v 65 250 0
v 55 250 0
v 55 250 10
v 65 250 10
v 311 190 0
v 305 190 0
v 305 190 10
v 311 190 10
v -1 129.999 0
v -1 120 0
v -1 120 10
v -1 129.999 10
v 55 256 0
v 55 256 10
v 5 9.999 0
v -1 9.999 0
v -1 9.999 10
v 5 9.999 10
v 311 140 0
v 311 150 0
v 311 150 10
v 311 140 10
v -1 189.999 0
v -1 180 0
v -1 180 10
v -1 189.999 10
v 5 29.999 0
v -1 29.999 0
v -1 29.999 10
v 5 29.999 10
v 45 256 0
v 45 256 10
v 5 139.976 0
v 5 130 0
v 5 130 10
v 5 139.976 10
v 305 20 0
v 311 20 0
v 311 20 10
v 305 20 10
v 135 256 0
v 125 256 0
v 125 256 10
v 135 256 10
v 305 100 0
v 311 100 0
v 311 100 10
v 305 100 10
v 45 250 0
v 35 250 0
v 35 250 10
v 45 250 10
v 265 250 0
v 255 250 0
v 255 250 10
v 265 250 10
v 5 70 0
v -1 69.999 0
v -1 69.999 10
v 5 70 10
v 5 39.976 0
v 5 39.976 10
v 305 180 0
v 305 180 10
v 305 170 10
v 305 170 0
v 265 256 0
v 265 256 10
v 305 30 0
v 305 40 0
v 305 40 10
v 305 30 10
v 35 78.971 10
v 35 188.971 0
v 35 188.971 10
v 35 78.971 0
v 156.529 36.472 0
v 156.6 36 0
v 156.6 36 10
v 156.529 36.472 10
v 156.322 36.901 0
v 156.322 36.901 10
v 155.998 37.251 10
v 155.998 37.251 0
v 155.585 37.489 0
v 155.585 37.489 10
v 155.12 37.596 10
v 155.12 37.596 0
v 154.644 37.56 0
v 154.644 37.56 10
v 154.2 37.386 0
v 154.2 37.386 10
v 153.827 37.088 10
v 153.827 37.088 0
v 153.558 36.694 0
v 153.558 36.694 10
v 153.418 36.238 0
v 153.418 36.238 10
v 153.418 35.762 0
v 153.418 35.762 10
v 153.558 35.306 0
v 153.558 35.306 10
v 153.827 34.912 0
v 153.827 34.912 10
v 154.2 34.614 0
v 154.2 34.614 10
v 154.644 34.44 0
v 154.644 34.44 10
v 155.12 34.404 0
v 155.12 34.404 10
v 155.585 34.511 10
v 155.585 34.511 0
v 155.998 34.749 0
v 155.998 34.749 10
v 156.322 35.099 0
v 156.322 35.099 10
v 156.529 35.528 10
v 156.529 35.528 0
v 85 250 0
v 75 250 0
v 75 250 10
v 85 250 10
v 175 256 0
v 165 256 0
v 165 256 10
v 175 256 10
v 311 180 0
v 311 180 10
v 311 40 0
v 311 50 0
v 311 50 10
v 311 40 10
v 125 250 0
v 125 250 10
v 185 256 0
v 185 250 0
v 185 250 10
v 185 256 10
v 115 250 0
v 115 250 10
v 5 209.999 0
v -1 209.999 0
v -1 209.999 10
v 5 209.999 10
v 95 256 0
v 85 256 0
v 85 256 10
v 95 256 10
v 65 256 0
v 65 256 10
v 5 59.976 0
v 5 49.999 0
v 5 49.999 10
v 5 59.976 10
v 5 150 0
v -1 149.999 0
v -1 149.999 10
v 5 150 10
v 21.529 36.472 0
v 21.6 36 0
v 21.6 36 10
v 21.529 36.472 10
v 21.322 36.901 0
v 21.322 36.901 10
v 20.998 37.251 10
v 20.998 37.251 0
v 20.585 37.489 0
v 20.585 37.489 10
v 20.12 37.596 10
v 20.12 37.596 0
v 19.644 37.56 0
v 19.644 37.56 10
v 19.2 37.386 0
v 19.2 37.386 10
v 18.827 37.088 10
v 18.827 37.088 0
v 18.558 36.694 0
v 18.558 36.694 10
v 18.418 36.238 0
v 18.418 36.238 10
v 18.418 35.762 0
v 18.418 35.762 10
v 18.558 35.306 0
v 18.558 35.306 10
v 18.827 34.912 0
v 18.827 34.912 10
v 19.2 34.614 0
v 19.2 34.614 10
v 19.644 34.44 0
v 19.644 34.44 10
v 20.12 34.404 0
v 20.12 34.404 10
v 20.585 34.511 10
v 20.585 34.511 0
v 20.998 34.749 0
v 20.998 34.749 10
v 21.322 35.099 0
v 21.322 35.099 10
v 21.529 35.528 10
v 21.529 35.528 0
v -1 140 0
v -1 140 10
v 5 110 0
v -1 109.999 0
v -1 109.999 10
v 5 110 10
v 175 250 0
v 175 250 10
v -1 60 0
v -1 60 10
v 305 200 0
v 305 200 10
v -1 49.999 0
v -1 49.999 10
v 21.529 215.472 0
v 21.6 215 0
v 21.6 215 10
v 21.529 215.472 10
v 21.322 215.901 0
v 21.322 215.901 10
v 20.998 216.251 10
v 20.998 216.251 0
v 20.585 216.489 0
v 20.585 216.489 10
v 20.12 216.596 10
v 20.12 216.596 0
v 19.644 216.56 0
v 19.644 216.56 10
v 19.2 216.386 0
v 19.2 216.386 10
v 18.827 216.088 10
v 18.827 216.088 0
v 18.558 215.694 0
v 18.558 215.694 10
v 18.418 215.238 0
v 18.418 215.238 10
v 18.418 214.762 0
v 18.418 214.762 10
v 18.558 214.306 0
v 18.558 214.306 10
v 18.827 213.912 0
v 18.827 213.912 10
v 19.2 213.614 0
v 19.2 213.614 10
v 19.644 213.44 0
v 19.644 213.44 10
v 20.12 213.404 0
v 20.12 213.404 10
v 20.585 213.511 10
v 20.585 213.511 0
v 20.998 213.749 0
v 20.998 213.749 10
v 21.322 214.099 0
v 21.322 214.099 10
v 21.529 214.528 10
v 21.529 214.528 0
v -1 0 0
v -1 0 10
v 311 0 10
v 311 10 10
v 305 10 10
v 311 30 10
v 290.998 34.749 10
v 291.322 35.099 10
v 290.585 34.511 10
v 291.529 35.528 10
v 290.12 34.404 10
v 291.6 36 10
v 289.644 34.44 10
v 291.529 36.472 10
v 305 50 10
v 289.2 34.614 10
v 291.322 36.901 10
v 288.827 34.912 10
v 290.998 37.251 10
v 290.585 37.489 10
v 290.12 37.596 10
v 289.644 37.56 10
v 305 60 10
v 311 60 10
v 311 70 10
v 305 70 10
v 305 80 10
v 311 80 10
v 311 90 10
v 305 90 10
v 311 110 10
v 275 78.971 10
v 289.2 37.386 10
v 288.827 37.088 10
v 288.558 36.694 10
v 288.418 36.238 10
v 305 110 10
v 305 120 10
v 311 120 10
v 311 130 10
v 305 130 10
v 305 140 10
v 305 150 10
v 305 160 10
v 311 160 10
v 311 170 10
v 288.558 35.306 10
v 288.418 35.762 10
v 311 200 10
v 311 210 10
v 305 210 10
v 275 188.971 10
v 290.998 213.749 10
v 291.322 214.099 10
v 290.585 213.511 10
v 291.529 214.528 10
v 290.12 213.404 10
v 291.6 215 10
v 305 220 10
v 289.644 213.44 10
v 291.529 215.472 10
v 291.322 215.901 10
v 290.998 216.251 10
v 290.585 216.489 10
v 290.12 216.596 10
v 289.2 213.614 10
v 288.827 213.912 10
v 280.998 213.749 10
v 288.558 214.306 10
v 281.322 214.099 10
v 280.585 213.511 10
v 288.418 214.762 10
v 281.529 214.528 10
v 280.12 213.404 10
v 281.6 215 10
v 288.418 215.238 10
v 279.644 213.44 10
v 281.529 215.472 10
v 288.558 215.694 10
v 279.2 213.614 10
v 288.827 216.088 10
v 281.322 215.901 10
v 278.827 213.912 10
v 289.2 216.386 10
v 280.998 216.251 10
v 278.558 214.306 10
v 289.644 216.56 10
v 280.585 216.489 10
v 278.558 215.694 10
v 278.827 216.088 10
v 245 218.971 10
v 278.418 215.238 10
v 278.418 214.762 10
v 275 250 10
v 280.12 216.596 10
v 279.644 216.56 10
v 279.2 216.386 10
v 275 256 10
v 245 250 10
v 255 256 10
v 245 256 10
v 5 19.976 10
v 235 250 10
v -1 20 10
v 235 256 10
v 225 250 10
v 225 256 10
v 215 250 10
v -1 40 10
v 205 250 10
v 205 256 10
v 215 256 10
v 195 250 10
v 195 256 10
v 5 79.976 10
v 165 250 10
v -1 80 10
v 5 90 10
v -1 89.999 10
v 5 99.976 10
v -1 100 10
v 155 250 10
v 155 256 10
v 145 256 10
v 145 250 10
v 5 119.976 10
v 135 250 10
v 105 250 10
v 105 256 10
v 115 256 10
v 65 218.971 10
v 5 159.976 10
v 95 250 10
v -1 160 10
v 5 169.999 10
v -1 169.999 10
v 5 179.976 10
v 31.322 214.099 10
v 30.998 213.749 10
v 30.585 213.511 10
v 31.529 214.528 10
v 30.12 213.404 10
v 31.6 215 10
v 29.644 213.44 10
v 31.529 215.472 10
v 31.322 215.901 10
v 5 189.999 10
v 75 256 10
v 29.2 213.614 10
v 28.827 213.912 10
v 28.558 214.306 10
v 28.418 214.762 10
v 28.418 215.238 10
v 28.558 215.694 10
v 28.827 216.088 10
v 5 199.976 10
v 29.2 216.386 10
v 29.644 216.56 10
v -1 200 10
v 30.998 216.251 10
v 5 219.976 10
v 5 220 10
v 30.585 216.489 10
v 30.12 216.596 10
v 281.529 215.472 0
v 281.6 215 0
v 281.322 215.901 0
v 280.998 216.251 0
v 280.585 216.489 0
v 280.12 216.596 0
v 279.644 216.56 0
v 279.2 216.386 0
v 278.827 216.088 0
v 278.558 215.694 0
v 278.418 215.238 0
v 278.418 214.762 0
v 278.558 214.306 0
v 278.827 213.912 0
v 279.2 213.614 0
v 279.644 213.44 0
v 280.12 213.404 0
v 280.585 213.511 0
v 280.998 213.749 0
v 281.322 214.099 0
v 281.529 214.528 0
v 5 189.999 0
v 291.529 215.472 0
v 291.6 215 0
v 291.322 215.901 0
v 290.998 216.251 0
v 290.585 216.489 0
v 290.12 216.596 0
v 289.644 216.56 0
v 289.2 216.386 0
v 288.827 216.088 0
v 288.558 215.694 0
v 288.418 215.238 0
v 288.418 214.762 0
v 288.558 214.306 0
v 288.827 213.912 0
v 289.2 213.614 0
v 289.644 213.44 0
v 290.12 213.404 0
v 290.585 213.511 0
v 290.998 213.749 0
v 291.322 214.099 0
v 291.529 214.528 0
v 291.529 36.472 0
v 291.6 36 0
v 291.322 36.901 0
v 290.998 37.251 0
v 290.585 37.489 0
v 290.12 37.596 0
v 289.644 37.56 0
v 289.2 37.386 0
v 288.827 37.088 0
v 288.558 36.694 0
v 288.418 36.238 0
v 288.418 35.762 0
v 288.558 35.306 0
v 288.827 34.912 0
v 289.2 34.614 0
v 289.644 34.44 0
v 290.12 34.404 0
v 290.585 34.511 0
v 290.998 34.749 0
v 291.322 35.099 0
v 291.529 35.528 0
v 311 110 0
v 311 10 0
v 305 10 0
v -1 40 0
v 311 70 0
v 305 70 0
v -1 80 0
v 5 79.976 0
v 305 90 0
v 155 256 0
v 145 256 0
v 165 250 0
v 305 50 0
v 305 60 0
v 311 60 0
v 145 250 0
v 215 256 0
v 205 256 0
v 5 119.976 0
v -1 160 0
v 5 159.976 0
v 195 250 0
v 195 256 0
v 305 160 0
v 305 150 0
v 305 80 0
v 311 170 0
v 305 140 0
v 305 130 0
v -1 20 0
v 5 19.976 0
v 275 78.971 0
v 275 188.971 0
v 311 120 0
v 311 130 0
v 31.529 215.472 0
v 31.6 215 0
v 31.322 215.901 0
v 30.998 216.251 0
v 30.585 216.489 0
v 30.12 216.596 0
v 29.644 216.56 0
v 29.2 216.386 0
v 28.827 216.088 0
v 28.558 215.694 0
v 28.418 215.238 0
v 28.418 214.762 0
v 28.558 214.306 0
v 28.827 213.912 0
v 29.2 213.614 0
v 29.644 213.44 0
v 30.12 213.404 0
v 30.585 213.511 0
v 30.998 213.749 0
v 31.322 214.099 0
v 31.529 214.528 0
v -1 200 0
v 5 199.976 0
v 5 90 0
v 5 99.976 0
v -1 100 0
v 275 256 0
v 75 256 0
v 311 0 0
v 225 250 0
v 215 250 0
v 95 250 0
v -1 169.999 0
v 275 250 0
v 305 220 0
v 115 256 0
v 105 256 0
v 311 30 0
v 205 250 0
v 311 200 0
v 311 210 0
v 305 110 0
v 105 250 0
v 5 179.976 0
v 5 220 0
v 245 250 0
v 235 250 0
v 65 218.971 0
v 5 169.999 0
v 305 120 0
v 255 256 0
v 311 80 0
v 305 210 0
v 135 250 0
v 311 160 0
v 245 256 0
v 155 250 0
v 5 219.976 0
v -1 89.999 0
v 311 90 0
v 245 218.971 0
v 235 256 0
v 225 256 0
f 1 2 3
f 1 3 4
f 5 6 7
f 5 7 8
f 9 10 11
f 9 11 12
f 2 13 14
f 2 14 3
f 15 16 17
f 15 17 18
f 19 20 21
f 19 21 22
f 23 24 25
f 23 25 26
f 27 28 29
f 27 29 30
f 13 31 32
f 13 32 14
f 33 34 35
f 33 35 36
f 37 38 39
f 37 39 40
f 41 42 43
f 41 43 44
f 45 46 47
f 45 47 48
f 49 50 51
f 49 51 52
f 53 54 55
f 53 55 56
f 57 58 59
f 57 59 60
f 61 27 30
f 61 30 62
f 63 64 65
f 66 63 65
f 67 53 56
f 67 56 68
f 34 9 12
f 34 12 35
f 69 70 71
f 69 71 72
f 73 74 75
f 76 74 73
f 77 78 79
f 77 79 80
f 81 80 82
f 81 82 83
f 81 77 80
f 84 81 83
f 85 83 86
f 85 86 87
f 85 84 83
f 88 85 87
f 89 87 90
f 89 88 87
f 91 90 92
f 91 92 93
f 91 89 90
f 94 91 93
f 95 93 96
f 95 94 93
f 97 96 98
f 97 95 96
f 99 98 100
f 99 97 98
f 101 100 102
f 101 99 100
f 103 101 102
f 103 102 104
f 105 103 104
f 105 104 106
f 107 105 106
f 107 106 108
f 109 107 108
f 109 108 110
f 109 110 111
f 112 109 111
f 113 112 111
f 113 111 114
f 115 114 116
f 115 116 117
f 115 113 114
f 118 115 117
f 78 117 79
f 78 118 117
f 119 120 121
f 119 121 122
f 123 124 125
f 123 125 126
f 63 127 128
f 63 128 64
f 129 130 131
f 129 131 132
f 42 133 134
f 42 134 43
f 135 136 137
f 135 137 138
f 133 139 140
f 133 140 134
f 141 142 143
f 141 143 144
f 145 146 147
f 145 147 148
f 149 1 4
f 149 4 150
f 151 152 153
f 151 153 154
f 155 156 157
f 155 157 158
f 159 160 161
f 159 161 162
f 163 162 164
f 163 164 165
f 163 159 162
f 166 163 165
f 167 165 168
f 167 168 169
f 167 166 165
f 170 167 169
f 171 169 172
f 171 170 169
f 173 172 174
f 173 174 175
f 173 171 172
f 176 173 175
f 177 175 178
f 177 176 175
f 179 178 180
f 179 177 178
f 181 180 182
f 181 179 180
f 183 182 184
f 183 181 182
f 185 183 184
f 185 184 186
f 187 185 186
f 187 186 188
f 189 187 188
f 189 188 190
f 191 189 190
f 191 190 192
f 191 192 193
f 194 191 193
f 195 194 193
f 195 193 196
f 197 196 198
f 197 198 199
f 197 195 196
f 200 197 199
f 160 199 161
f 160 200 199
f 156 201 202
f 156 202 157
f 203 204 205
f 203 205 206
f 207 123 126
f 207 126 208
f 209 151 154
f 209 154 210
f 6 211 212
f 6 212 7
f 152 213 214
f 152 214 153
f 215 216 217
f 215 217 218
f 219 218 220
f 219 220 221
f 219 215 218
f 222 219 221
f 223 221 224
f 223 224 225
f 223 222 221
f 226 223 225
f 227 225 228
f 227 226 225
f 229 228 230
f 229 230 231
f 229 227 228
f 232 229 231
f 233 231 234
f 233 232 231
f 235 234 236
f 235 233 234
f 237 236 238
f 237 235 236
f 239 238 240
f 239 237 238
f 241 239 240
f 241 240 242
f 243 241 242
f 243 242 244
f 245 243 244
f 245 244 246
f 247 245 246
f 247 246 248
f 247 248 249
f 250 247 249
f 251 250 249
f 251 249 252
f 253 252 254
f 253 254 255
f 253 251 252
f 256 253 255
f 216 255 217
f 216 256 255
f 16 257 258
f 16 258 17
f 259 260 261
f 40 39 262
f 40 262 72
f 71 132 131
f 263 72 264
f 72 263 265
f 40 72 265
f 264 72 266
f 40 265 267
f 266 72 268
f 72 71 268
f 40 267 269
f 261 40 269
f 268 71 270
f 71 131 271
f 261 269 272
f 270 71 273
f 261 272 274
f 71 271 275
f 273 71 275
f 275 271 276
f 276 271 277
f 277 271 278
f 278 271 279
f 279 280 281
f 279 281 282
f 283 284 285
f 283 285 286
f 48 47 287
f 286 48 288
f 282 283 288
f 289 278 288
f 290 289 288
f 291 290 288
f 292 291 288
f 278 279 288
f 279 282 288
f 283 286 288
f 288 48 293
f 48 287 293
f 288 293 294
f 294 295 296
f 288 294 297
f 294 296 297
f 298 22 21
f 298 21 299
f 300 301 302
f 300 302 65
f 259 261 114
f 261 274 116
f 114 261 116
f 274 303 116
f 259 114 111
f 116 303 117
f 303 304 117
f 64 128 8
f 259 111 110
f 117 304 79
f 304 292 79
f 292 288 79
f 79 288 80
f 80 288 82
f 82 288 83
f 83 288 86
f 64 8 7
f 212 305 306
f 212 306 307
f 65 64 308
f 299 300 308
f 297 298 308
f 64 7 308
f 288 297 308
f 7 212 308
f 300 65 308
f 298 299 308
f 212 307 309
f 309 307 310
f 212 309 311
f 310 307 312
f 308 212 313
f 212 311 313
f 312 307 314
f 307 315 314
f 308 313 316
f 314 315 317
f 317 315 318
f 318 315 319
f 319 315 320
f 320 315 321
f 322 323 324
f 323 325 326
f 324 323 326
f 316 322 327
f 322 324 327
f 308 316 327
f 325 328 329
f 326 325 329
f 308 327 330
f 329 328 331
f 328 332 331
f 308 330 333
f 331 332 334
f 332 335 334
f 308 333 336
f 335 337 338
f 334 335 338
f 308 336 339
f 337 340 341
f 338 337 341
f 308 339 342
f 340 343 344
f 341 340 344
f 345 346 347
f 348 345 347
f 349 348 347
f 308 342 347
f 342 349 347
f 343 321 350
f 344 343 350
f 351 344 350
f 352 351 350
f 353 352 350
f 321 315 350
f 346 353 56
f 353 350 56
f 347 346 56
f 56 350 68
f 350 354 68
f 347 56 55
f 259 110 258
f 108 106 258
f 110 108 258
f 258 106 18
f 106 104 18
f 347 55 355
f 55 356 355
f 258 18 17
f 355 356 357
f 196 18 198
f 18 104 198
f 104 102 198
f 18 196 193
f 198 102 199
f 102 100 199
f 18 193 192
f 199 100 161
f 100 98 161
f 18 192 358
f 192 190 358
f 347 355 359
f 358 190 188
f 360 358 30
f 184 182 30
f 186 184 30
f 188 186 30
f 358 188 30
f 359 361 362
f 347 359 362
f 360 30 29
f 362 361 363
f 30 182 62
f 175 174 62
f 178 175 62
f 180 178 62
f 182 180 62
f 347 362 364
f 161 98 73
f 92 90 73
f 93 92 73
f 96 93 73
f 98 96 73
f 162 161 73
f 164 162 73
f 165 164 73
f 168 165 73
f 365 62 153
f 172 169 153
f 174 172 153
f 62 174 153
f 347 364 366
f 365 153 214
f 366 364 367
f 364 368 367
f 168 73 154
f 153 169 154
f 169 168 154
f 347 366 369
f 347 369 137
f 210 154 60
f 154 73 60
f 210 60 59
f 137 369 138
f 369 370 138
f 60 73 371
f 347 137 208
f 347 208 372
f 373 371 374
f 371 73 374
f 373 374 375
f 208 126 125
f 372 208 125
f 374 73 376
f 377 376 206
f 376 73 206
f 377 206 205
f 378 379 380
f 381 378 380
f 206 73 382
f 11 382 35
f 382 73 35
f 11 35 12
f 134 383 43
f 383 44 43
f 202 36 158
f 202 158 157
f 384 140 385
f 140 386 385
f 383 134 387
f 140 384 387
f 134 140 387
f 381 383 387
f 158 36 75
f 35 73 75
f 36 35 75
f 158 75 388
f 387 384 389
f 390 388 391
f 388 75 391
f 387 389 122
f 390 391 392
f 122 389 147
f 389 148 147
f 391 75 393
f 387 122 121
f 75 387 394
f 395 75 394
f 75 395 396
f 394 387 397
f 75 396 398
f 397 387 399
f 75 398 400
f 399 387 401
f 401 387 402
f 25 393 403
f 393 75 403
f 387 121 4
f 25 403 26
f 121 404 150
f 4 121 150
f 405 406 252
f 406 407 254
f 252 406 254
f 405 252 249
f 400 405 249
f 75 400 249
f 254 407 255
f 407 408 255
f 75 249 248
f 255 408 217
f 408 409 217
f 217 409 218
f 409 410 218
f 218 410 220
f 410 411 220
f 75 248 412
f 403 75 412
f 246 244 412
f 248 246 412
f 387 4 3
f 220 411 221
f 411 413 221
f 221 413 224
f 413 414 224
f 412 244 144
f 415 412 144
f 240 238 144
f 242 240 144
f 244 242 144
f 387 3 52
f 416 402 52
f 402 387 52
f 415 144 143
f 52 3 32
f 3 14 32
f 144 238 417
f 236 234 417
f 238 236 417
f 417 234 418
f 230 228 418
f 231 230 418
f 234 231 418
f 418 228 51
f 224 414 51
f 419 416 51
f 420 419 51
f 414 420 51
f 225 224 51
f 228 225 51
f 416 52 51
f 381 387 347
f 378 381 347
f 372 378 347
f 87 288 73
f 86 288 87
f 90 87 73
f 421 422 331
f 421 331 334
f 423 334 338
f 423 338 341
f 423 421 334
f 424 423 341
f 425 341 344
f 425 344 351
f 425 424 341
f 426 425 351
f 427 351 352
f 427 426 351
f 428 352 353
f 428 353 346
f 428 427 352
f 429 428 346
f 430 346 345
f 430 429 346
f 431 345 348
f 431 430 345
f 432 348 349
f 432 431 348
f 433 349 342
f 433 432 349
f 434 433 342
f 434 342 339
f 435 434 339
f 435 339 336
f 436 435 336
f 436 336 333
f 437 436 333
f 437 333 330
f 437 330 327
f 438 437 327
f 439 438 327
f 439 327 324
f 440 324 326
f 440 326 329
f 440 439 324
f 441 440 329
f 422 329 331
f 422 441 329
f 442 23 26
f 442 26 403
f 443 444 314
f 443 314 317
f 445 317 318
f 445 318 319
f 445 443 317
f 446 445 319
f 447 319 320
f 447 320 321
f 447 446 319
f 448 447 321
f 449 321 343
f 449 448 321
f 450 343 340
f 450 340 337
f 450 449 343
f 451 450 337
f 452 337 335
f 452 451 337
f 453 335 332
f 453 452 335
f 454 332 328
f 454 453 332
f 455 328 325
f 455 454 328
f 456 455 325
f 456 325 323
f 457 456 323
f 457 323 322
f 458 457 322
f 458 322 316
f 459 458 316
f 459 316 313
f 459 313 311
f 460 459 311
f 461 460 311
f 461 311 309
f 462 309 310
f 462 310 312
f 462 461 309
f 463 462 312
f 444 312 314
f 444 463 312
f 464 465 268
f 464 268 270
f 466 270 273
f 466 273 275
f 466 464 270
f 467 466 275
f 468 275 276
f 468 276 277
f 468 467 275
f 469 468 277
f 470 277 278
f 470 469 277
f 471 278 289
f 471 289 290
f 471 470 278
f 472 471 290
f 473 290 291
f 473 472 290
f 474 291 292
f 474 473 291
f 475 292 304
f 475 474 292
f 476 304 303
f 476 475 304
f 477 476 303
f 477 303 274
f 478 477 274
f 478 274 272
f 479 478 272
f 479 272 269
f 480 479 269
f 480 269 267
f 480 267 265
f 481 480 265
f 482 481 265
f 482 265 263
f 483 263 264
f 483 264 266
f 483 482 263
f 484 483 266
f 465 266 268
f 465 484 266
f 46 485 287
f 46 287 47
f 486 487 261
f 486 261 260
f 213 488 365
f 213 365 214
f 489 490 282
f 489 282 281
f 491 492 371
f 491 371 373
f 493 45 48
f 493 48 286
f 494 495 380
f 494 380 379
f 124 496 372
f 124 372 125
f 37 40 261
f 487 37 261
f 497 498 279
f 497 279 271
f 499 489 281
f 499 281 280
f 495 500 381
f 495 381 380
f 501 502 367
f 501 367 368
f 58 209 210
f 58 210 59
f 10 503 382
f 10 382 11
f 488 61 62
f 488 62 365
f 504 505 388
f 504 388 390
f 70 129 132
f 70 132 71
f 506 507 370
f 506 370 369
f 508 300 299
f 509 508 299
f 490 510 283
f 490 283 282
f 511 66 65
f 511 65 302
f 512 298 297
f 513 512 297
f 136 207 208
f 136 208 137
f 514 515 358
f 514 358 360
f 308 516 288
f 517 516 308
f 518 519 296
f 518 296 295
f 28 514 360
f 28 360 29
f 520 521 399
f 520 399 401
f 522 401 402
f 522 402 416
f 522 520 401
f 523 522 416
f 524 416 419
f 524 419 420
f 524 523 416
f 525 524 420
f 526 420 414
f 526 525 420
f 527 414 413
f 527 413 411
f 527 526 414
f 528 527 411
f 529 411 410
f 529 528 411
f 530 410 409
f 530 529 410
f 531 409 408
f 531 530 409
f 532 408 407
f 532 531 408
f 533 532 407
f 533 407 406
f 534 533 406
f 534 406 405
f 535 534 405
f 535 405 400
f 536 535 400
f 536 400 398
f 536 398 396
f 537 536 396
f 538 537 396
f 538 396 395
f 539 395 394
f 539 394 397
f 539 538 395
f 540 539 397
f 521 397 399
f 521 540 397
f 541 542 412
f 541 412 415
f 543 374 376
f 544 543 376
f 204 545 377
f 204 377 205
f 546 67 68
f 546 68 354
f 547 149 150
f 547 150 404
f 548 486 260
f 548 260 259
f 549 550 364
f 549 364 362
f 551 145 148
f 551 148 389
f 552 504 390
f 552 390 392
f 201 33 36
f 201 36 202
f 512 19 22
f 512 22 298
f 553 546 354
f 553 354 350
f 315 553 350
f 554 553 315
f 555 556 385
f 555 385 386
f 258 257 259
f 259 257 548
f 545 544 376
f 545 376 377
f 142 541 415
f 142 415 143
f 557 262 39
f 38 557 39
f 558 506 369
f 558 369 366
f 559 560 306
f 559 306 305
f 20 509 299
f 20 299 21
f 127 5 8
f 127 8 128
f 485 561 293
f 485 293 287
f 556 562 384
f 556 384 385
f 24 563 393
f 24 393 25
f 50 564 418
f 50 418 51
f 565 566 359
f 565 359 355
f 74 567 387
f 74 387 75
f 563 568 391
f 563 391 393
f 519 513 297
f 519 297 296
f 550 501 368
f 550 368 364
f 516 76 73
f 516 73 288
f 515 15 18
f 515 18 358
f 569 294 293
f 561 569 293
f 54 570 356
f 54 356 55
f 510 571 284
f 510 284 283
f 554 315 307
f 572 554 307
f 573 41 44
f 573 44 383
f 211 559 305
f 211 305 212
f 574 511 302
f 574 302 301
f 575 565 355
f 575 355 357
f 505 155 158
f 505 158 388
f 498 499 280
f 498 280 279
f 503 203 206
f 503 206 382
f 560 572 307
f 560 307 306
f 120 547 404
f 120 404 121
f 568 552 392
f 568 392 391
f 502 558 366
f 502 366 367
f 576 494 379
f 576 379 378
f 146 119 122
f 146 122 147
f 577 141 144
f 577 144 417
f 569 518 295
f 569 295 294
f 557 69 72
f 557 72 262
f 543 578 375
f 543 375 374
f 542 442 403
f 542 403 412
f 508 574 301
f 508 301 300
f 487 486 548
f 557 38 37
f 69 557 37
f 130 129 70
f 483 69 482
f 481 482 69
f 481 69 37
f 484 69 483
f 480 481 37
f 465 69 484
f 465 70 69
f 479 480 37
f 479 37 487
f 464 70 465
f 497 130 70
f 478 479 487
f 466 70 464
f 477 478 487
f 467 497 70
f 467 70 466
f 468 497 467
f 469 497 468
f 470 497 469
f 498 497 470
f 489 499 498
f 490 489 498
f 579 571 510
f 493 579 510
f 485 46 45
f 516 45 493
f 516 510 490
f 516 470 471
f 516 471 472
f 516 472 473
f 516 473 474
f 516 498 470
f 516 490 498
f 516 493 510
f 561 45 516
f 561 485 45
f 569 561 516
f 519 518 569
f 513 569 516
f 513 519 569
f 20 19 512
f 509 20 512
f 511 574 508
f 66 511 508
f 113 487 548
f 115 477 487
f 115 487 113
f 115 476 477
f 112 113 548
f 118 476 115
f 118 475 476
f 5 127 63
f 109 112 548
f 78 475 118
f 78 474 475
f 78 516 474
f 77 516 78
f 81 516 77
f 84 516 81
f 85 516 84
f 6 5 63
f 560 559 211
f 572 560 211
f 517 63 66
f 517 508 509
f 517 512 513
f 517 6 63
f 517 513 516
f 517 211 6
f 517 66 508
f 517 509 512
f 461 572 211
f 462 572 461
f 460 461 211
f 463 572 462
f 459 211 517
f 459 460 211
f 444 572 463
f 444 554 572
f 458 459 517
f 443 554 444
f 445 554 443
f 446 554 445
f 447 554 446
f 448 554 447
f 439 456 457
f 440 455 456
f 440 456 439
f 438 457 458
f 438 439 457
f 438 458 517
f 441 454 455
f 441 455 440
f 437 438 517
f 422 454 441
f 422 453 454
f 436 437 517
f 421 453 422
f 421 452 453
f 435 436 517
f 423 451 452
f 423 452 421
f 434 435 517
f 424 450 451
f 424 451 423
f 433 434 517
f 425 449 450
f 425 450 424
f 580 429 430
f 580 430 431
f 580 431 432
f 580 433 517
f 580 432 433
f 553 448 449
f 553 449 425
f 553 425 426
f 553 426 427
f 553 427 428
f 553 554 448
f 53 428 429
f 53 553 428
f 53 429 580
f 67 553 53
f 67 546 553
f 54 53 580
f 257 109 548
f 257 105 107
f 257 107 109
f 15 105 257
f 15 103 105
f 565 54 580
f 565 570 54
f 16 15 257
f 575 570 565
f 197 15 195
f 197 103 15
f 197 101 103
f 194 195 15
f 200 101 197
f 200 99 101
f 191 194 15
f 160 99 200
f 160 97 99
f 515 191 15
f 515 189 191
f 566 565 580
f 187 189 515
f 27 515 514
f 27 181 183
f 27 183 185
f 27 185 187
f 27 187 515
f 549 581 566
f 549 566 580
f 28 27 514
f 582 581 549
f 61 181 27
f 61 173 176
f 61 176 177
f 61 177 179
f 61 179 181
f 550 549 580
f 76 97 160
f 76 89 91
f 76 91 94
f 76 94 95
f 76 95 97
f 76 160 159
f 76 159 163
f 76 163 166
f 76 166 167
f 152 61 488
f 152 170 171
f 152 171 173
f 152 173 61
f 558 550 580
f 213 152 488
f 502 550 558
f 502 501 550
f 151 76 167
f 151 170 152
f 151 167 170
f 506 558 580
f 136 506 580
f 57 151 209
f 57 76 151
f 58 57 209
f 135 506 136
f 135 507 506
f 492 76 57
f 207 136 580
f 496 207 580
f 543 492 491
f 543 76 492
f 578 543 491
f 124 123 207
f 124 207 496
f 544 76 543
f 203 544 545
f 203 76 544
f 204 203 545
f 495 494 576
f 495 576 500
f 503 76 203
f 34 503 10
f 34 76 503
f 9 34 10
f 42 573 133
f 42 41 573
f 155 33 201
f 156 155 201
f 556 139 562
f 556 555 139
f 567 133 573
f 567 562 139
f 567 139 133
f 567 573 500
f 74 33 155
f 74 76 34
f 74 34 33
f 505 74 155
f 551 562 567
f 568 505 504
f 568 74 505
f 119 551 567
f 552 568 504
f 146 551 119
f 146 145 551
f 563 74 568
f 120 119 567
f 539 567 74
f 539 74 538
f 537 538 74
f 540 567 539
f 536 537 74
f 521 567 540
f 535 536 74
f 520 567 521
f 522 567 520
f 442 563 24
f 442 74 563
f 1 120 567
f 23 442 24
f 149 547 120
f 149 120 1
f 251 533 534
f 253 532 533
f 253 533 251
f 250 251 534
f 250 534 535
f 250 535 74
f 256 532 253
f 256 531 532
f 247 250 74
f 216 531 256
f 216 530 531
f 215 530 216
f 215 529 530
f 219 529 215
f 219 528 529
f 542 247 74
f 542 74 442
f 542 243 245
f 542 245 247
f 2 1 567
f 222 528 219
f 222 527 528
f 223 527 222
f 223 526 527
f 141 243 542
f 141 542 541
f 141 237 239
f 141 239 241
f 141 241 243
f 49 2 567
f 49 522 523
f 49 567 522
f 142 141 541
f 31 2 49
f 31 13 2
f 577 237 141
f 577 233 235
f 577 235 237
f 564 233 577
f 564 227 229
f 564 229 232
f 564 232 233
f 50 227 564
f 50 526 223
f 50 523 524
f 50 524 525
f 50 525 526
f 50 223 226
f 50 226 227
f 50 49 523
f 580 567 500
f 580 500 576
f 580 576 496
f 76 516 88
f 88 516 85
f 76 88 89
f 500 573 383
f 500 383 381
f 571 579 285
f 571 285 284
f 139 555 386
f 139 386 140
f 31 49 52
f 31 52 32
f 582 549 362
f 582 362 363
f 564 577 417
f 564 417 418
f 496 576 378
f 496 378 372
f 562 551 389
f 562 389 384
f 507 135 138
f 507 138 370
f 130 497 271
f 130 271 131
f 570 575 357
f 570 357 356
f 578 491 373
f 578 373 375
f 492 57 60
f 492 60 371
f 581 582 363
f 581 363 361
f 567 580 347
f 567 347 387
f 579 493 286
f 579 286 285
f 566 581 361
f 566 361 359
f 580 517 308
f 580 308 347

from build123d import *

# Parameters (mm, degrees)
SKIZZE1_R                       = 1.6
AUFSATZ_LINEAR_AUSTRAGEN1_DEPTH = 10


with BuildPart() as part:
    # Skizze1 → Aufsatz-Linear austragen1 (new body)
    with BuildSketch(Plane.XY):
        Polygon((5, 9.999223218), (4.999950827, 19.975708513), (-1, 19.999999998), (-1, 29.999223216), (5, 29.999223216), (4.999950827, 39.975708511), (-1, 39.999999996), (-1, 49.999223214), (5, 49.999223214), (4.999950827, 59.975708509), (-1, 59.999999994), (-1, 69.999223211), (5, 70), (4.999950827, 79.975708506), (-1, 79.999999991), (-1, 89.999223209), (5, 90), (4.999950827, 99.975708504), (-1, 99.999999989), (-1, 109.999223207), (5, 110), (4.999950827, 119.975708502), (-1, 119.999999987), (-1, 129.999223205), (5, 130), (4.999950827, 139.9757085), (-1, 139.999999985), (-1, 149.999223203), (5, 150), (4.999950827, 159.975708498), (-1, 159.999999983), (-1, 169.999223201), (5, 169.999223201), (4.999950827, 179.975708496), (-1, 179.999999981), (-1, 189.999223198), (5, 189.999223198), (4.999950827, 199.975708493), (-1, 199.999999978), (-1, 209.999223196), (5, 209.999223196), (4.999950827, 219.975708491), (5.0000043, 219.999971242), (35.0000043, 249.999971242), (45, 249.999971242), (45, 255.999971242), (55.0000043, 255.999971242), (55.0000043, 249.999971242), (65, 249.999971242), (65, 255.999971242), (75.0000043, 255.999971242), (75.0000043, 249.999971242), (85, 249.999971242), (85, 255.999971242), (95.0000043, 255.999971242), (95.0000043, 249.999971242), (105, 249.999971242), (105, 255.999971242), (115.0000043, 255.999971242), (115.0000043, 249.999971242), (125, 249.999971242), (125, 255.999971242), (135.0000043, 255.999971242), (135.0000043, 249.999971242), (145, 249.999971242), (145, 255.999971242), (155.0000043, 255.999971242), (155.0000043, 249.999971242), (165, 249.999971242), (165, 255.999971242), (175.0000043, 255.999971242), (175.0000043, 249.999971242), (185, 249.999971242), (185, 255.999971242), (195.0000043, 255.999971242), (195.0000043, 249.999971242), (205, 249.999971242), (205, 255.999971242), (215.0000043, 255.999971242), (215.0000043, 249.999971242), (225, 249.999971242), (225, 255.999971242), (235.0000043, 255.999971242), (235.0000043, 249.999971242), (245, 249.999971242), (245, 255.999971242), (255.0000043, 255.999971242), (255.0000043, 249.999971242), (265, 249.999971242), (265, 255.999971242), (275.0000043, 255.999971242), (275.0000043, 249.999971242), (305.0000043, 219.999969416), (304.999999999, 209.999969615), (311, 209.999967035), (311, 199.999972196), (305.0000043, 199.999972196), (304.999999999, 189.999972396), (311, 189.999969815), (311, 179.999974976), (305.0000043, 179.999974976), (304.999999999, 169.999975176), (311, 169.999972595), (311, 159.999977757), (305.0000043, 159.999977757), (304.999999999, 149.999977957), (311, 149.999975376), (311, 139.999980537), (305.0000043, 139.999980537), (304.999999999, 129.999980737), (311, 129.999978156), (311, 119.999983318), (305.0000043, 119.999983318), (304.999999999, 109.999983517), (311, 109.999980937), (311, 99.999986098), (305.0000043, 99.999986098), (304.999999999, 89.999986298), (311, 89.999983717), (311, 79.999988878), (305.0000043, 79.999988878), (304.999999999, 69.999989078), (311, 69.999986497), (311, 59.999991659), (305.0000043, 59.999991659), (304.999999999, 49.999991859), (311, 49.999989278), (311, 39.999994439), (305.0000043, 39.999994439), (304.999999999, 29.999994639), (311, 29.999992058), (311, 19.99999722), (305.0000043, 19.99999722), (304.999999999, 9.999997419), (311, 9.999994839), (311, 0), (305.0000043, 0), (4.956899878, 0), (-1, 0), (-1, 9.999223218), align=None)
        with Locations((290, 214.999999999)):
            Circle(SKIZZE1_R, mode=Mode.SUBTRACT)
        with Locations((280, 214.999999999)):
            Circle(SKIZZE1_R, mode=Mode.SUBTRACT)
        with Locations((20, 215)):
            Circle(SKIZZE1_R, mode=Mode.SUBTRACT)
        with Locations((30, 215)):
            Circle(SKIZZE1_R, mode=Mode.SUBTRACT)
        with Locations((20, 36)):
            Circle(SKIZZE1_R, mode=Mode.SUBTRACT)
        with Locations((155, 36)):
            Circle(SKIZZE1_R, mode=Mode.SUBTRACT)
        with Locations((290, 36)):
            Circle(SKIZZE1_R, mode=Mode.SUBTRACT)
        Polygon((275, 188.971165398), (245, 218.971165398), (65, 218.971165398), (35, 188.971165398), (35, 78.971165398), (275, 78.971165398), align=None, mode=Mode.SUBTRACT)
    extrude(amount=AUFSATZ_LINEAR_AUSTRAGEN1_DEPTH)


solid = part.part
